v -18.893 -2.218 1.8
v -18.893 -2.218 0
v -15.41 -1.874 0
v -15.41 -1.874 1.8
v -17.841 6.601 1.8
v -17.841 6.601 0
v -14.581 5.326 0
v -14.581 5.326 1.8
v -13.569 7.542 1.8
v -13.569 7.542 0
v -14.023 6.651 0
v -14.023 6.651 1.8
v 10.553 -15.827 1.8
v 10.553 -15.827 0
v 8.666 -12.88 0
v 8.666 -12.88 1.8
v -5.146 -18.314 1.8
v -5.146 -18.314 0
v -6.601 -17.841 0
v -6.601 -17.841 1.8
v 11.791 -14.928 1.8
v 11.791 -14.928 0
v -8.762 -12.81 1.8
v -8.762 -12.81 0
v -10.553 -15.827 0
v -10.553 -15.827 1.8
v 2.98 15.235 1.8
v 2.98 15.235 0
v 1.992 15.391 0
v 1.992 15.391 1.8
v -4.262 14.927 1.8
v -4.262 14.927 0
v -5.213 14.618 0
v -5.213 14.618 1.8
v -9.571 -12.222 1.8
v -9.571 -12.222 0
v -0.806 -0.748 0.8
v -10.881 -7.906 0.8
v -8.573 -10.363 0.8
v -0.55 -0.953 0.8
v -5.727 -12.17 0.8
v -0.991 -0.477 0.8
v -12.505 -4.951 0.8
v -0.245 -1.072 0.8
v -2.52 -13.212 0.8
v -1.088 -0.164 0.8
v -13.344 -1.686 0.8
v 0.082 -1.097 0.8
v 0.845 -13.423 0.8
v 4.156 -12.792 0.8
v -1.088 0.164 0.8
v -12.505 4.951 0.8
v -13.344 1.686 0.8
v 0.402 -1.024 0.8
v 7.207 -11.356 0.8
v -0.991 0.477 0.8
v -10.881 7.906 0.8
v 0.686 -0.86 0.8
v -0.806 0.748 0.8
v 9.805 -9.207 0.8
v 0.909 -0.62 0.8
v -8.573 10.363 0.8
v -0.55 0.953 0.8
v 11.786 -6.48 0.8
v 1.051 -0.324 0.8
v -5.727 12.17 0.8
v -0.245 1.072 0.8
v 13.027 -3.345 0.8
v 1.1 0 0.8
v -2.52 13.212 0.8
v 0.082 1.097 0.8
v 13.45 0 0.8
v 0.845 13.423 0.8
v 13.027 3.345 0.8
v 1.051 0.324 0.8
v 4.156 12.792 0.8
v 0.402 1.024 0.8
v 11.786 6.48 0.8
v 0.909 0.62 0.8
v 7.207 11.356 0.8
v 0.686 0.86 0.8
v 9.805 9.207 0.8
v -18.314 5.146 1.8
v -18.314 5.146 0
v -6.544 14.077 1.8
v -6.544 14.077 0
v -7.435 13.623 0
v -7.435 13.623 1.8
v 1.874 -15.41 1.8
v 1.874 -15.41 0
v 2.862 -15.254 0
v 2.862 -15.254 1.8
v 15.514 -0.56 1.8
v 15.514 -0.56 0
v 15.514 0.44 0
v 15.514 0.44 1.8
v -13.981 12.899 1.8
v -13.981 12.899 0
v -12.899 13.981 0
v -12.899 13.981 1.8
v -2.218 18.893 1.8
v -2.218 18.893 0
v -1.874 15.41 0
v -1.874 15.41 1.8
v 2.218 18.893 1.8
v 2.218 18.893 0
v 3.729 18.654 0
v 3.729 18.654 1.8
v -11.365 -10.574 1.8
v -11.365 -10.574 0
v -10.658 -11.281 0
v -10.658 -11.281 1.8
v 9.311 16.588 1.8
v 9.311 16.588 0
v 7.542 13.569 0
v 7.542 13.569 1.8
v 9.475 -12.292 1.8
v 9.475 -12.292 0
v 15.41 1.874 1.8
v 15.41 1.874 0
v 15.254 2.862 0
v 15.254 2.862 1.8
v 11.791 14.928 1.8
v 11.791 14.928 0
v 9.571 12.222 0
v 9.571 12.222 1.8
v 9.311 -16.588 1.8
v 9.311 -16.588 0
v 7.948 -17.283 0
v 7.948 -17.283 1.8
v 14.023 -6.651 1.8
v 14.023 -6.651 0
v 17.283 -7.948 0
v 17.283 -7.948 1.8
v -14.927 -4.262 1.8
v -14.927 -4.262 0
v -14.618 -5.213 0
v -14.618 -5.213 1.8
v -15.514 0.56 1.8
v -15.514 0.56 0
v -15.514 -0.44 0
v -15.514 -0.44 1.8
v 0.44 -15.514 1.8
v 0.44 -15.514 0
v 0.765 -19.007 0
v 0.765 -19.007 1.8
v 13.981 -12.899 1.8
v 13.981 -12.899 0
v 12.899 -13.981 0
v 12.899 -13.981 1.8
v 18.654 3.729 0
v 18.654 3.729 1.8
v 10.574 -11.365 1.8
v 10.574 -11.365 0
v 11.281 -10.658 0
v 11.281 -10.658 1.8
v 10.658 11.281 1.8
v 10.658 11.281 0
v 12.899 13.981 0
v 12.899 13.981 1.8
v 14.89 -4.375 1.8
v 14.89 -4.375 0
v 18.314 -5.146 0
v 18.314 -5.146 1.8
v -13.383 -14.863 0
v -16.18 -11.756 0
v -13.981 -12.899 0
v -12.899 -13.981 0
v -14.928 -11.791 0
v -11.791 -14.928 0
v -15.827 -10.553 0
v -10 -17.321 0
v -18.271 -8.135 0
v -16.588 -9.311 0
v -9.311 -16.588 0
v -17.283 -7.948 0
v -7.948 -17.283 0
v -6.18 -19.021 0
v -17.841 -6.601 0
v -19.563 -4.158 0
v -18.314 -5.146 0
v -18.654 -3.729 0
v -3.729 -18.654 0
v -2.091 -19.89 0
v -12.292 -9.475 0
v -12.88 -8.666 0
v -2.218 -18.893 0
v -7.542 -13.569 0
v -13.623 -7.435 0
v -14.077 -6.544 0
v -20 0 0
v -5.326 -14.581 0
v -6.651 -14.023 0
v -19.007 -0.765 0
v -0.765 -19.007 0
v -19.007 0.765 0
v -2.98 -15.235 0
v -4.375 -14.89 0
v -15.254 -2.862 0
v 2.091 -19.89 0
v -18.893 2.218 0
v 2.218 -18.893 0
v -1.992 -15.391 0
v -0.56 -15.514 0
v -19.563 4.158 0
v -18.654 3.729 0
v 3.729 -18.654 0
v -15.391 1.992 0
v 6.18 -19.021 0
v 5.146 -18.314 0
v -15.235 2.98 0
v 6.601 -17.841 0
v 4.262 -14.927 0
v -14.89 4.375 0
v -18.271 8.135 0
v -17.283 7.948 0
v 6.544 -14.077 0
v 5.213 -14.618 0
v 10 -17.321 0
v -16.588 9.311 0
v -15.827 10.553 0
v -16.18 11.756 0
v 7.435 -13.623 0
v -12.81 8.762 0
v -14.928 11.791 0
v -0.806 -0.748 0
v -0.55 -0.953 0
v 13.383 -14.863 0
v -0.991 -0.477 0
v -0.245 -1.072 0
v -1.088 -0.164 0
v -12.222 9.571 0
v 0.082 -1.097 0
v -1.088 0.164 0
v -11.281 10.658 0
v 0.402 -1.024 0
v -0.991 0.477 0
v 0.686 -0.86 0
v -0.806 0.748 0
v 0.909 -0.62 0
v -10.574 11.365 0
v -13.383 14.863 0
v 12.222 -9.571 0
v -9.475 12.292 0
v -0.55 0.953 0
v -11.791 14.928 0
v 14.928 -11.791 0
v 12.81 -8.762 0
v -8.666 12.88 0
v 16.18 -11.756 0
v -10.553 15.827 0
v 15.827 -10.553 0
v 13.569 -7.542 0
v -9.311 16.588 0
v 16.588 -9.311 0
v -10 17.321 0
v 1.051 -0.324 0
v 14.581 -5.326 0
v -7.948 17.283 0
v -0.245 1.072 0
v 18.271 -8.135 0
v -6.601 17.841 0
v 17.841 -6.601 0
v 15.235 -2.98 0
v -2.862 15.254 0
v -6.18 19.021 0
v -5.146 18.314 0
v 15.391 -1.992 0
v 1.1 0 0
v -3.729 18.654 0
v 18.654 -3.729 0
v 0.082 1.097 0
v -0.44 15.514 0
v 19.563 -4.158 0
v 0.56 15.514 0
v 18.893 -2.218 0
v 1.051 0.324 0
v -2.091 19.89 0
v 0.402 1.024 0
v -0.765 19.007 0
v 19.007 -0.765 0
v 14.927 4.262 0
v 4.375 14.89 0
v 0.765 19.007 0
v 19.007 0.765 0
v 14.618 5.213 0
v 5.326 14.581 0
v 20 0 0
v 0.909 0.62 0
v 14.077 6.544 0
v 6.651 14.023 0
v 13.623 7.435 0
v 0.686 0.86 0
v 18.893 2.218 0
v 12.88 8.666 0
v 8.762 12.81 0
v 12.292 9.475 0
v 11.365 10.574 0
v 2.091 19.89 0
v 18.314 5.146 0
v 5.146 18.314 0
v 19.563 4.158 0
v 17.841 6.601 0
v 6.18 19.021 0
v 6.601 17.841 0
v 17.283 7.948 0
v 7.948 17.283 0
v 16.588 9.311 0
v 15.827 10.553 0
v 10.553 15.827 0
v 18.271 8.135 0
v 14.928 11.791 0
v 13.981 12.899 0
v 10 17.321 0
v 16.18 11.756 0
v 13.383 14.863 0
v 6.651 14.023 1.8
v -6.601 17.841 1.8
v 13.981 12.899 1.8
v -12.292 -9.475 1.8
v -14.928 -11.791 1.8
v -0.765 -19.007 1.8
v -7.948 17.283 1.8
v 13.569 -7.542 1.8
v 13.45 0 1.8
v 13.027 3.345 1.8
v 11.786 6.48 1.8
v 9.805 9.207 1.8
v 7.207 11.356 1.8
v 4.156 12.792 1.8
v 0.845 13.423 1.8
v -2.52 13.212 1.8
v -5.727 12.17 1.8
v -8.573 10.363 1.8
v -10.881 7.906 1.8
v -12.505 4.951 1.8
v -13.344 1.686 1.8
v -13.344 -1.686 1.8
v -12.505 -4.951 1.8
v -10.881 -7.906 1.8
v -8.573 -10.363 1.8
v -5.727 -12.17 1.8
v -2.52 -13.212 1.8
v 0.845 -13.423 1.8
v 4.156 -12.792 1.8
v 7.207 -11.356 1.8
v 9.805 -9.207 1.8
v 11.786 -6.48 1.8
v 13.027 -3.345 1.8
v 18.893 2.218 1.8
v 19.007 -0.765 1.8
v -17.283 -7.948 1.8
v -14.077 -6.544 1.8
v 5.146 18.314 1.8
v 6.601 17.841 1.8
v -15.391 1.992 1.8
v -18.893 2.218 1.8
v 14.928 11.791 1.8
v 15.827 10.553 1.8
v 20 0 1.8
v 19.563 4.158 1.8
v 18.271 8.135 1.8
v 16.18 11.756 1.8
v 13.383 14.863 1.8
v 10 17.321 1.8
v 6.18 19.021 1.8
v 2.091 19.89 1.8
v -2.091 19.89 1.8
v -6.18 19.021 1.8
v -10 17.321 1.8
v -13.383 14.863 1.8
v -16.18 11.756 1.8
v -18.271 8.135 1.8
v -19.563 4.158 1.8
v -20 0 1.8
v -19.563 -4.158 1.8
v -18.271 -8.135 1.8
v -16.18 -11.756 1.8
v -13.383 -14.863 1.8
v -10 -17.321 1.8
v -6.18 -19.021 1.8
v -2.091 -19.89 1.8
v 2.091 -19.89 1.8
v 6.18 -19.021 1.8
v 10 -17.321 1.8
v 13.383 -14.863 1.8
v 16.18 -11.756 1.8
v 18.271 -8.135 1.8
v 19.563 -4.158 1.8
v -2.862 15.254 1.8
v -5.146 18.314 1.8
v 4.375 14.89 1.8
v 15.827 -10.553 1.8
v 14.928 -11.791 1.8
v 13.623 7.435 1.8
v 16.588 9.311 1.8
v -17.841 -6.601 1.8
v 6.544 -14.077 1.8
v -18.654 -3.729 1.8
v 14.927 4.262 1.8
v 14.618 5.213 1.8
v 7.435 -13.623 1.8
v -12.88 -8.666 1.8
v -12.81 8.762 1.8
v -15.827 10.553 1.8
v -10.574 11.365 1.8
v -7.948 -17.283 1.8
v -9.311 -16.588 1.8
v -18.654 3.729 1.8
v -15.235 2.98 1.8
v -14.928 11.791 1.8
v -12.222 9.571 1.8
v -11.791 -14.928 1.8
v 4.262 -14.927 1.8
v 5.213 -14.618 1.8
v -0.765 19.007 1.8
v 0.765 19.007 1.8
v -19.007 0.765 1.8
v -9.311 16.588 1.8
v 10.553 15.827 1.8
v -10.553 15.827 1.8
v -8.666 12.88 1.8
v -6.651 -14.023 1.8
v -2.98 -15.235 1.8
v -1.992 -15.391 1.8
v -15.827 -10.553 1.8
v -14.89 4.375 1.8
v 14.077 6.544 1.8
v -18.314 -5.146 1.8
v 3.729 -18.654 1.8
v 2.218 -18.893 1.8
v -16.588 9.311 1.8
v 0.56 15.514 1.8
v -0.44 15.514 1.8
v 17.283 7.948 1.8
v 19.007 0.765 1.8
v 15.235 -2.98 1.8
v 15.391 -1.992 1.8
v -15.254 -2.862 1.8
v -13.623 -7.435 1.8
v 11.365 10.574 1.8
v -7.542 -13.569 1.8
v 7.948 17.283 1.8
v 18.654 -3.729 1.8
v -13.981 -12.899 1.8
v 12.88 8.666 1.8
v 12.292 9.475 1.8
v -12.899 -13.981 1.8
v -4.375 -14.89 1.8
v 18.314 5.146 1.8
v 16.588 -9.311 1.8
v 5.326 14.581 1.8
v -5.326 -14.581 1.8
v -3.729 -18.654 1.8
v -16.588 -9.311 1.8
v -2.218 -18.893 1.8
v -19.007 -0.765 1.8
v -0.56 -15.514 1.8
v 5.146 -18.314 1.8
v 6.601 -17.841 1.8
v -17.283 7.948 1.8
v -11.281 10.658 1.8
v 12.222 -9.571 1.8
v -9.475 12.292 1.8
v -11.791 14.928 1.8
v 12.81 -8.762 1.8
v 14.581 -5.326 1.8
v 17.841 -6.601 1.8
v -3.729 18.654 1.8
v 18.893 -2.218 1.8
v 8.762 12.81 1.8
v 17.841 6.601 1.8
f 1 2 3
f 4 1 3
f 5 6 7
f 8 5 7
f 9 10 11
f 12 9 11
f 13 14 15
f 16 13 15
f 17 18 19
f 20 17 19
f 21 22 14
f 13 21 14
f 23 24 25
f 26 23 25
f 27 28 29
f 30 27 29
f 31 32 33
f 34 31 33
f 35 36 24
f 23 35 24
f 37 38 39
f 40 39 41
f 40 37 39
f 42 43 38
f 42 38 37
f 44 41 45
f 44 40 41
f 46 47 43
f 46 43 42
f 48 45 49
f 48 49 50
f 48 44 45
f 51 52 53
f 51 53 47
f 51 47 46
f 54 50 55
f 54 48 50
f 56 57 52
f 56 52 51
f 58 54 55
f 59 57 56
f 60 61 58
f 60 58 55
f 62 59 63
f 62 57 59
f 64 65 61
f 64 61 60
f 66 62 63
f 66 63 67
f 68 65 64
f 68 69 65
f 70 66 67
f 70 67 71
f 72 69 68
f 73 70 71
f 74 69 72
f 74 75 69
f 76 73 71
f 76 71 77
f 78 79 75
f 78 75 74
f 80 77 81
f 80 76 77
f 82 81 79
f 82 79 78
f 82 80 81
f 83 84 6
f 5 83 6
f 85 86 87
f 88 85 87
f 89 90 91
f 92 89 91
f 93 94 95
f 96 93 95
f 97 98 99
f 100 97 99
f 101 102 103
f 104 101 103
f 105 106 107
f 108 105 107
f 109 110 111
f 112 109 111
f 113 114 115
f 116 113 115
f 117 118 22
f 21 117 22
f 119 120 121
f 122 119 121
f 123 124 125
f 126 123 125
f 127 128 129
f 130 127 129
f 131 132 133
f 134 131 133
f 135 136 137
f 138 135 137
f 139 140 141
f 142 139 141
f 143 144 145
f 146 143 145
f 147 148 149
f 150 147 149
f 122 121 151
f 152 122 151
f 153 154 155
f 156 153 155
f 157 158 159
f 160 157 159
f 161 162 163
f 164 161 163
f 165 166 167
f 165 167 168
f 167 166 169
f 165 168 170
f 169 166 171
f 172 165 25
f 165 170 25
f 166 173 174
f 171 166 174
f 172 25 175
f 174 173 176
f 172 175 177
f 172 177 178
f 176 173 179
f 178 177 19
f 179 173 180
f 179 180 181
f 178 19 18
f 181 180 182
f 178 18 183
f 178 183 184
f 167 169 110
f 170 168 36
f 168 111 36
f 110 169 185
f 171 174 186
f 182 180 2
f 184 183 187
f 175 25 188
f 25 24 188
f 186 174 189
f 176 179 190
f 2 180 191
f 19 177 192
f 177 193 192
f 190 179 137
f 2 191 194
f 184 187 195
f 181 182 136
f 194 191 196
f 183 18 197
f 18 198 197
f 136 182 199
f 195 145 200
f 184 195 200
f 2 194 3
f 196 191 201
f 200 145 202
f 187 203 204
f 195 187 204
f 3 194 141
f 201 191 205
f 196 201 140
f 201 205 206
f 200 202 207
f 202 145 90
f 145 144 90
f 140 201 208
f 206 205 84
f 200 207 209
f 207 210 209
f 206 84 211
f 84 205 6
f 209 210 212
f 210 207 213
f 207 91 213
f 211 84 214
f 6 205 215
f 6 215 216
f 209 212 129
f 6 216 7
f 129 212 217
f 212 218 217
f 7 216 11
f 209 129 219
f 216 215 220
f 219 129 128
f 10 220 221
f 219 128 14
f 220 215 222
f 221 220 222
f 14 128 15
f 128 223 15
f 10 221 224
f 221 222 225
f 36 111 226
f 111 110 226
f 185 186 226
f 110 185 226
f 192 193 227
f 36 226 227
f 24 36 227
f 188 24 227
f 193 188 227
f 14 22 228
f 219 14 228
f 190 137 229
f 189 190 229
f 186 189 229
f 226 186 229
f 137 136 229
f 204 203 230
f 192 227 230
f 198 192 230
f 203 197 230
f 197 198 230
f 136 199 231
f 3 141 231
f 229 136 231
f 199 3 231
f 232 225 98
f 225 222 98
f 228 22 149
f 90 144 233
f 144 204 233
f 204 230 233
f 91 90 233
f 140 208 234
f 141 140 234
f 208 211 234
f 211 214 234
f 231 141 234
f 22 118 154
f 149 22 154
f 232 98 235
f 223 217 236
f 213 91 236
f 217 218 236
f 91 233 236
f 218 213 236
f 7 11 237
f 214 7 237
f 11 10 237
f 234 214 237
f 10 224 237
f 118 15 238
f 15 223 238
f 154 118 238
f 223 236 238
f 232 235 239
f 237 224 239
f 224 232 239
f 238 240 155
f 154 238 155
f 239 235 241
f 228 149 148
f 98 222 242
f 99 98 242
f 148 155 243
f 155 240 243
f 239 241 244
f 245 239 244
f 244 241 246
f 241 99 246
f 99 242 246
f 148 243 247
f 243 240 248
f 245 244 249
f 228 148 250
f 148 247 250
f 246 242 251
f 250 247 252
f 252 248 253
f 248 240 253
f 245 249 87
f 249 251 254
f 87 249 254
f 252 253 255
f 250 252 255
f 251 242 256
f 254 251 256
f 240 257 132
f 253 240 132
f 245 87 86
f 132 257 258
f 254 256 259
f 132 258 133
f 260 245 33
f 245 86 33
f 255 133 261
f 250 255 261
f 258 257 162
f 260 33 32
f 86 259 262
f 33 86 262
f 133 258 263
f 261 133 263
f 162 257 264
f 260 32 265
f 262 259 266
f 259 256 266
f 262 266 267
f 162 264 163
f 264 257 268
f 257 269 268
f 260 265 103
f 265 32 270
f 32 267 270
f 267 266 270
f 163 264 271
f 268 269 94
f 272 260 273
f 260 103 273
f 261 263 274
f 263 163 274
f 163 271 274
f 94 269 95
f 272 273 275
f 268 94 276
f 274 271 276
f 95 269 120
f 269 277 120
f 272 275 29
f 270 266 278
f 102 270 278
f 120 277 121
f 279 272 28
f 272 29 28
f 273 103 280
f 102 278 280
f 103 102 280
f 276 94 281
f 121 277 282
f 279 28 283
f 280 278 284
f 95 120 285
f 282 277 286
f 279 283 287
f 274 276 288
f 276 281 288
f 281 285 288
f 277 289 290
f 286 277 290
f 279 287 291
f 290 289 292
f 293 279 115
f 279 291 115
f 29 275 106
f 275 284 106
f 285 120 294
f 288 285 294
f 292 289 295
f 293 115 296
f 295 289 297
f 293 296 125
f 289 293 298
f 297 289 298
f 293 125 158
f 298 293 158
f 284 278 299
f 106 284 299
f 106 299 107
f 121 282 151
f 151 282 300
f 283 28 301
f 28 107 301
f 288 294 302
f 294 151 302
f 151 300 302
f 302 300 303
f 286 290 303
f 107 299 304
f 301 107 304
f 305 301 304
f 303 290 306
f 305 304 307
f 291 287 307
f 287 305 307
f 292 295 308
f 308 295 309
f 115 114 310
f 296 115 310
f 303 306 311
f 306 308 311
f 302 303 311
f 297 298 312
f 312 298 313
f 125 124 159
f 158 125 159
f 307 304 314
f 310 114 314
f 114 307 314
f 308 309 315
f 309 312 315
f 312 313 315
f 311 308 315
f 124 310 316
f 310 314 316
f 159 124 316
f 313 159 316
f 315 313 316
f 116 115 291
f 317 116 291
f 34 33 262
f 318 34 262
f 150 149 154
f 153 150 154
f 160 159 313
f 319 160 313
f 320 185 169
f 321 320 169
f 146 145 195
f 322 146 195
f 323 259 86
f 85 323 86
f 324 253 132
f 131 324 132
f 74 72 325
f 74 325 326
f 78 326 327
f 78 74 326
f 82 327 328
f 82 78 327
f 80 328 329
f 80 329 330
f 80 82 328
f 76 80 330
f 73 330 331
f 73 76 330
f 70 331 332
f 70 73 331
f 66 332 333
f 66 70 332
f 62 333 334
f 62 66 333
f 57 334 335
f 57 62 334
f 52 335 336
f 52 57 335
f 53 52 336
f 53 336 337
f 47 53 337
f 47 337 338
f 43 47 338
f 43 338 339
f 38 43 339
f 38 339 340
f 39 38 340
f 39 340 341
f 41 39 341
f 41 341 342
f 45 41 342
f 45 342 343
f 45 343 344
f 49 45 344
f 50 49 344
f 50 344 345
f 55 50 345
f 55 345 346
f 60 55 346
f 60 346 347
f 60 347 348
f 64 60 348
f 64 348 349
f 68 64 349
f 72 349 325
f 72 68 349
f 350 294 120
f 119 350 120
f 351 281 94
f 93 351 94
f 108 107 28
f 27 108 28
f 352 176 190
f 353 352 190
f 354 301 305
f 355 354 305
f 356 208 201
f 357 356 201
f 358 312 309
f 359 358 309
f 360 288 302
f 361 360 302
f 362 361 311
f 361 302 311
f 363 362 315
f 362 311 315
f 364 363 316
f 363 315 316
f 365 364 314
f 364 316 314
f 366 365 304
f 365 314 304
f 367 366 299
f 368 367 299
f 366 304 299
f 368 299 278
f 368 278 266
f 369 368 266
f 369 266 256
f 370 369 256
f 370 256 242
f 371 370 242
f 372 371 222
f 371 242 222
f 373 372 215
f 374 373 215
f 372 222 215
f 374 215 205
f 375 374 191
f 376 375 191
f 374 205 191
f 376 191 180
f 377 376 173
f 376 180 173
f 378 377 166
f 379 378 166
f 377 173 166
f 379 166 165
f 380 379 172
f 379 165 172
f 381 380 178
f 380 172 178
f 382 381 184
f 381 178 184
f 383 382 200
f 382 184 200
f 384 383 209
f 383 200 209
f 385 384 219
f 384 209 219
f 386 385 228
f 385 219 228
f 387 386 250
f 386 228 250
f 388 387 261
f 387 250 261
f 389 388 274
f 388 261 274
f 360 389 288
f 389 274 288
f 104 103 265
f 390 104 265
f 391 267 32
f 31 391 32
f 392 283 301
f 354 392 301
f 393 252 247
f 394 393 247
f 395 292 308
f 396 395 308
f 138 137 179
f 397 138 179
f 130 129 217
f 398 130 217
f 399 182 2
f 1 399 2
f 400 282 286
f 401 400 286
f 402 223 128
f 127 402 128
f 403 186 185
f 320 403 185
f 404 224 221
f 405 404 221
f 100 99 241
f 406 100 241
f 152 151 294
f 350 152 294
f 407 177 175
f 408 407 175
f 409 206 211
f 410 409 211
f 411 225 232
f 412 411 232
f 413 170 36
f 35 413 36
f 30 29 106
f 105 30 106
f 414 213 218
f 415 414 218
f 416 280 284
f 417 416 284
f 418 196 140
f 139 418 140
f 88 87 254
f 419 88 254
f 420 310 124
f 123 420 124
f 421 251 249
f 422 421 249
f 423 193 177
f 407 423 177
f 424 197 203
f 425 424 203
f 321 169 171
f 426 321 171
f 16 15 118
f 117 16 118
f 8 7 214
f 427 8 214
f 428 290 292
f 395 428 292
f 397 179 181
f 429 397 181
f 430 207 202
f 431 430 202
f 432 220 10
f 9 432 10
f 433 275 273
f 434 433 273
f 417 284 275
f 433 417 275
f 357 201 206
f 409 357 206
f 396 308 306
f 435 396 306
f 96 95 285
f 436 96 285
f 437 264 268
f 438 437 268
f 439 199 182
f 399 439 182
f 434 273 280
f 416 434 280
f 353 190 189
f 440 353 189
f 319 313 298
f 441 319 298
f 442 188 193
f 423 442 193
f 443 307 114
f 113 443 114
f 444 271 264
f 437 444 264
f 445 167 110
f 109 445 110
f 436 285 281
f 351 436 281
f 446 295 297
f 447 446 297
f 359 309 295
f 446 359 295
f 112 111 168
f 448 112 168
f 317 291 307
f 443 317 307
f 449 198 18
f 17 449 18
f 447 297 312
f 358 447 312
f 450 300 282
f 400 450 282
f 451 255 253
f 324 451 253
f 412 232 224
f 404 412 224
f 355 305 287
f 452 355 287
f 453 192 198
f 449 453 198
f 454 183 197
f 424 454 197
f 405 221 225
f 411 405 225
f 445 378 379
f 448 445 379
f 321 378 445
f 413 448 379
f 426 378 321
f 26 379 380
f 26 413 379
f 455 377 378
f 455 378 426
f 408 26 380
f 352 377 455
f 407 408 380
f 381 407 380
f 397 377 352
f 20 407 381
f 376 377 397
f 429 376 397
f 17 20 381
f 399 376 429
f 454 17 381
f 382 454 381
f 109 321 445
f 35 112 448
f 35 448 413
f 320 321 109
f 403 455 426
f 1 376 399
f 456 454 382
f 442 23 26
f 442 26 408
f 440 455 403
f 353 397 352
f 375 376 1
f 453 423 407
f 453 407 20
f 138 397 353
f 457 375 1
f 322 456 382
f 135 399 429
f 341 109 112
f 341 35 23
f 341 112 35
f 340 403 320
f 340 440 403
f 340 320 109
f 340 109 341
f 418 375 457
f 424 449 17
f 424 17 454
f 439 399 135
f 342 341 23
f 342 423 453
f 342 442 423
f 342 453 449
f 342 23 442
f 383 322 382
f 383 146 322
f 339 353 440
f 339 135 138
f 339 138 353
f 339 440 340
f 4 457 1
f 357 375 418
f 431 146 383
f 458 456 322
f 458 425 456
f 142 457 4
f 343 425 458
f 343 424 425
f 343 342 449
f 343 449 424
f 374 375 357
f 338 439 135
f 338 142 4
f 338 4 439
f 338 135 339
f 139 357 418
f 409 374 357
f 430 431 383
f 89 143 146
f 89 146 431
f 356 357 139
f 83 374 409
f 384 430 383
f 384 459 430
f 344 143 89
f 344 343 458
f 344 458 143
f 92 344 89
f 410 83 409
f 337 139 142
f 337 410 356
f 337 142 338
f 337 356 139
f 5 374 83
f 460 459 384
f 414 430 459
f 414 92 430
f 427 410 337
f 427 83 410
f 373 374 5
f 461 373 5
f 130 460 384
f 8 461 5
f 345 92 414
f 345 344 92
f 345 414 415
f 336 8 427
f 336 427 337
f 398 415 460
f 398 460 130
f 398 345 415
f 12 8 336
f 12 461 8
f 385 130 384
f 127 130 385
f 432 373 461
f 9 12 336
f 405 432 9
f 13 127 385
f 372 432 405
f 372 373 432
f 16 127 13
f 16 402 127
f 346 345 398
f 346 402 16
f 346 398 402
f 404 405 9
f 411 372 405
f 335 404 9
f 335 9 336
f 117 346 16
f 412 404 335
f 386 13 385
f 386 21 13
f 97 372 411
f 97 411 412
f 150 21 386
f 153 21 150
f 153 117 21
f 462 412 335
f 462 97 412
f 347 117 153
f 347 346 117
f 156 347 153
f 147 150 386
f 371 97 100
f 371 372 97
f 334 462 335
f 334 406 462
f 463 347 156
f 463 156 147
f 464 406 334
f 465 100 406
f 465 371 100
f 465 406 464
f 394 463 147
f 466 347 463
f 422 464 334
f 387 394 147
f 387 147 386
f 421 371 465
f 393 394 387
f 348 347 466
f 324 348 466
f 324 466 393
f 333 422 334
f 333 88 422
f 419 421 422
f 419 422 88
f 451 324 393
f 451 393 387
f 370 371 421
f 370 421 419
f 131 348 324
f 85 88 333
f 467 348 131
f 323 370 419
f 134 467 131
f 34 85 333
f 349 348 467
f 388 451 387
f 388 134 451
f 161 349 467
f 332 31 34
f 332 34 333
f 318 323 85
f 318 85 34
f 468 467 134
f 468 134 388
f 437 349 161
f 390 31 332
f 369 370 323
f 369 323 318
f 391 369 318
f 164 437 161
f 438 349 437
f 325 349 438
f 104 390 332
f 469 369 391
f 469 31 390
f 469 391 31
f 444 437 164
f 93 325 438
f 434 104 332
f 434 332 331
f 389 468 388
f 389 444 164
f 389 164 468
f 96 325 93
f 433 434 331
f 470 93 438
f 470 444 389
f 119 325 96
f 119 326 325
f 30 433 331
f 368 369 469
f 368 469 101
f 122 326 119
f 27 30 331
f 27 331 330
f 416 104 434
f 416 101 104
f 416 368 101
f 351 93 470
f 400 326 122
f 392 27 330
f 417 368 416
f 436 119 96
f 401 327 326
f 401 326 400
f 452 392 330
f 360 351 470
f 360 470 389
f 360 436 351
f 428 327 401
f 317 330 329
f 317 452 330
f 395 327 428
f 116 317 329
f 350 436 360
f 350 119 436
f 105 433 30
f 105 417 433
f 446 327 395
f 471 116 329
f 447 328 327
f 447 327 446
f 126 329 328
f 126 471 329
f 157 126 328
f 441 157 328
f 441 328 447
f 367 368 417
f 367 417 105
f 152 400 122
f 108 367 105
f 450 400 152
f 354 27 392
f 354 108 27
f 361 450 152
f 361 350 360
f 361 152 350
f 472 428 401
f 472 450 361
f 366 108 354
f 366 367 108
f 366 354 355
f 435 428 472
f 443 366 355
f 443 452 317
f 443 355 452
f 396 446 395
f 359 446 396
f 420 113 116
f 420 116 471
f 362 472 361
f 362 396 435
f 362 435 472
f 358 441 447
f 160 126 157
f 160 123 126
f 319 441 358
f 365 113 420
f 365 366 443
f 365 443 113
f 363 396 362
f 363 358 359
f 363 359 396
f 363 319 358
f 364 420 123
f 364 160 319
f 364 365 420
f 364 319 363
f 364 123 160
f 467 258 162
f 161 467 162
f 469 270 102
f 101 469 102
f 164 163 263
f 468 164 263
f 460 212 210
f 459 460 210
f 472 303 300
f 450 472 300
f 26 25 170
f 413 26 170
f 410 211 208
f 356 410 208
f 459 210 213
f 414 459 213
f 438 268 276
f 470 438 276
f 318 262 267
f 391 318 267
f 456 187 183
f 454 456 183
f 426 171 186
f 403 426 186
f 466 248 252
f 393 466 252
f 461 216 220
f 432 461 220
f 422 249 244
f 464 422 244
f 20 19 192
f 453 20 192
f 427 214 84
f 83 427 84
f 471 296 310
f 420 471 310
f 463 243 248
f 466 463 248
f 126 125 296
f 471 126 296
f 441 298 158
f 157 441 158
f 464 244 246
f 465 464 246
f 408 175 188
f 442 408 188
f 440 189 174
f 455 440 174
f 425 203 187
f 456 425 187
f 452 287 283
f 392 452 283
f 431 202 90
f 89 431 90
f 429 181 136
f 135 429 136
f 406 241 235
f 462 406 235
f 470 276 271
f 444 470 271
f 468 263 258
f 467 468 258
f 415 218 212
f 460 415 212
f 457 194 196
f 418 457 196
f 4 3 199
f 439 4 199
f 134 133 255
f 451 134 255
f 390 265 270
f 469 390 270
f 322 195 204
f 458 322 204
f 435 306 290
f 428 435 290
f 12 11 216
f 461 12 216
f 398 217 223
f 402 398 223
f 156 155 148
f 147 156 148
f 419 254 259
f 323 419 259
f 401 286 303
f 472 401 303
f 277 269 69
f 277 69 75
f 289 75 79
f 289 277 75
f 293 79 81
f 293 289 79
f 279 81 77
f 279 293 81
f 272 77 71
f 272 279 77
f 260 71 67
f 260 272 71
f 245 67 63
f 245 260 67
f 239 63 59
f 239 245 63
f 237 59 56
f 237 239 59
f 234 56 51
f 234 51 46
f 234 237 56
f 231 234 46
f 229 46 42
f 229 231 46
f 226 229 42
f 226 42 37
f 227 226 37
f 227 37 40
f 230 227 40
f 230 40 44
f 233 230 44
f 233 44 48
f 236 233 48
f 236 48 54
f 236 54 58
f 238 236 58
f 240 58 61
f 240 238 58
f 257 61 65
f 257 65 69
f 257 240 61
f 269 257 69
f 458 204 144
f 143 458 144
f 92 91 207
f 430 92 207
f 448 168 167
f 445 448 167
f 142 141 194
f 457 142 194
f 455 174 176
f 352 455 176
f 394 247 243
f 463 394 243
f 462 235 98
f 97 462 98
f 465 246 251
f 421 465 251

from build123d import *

# Parameters (mm, degrees)
F0_R     = 20
F0_R_2   = 13.45
F1_DEPTH = 1.8
F0_R_3   = 1.1
F2_DEPTH = 0.8


with BuildPart() as f1:
    # F0 (on Top) → F1 (new body)
    with BuildSketch(Plane.XY):
        Circle(F0_R)
        Polygon((-10.553413, -15.827023), (-11.791209, -14.927711), (-9.571323, -12.221773), (-8.762306, -12.809558), align=None, mode=Mode.SUBTRACT)
        Polygon((-14.927711, -11.791209), (-15.827023, -10.553413), (-12.879604, -8.665895), (-12.291819, -9.474912), align=None, mode=Mode.SUBTRACT)
        Polygon((-12.899375, -13.981248), (-13.981248, -12.899375), (-11.365391, -10.574017), (-10.658284, -11.281124), align=None, mode=Mode.SUBTRACT)
        Polygon((-7.947591, -17.283083), (-9.310831, -16.588478), (-7.541578, -13.568587), (-6.650571, -14.022578), align=None, mode=Mode.SUBTRACT)
        Polygon((-5.146073, -18.313577), (-6.60119, -17.840781), (-5.326134, -14.581298), (-4.375077, -14.890315), align=None, mode=Mode.SUBTRACT)
        Polygon((-2.217842, -18.89313), (-3.729005, -18.653785), (-2.979543, -15.234969), (-1.991854, -15.391403), align=None, mode=Mode.SUBTRACT)
        Polygon((-16.588478, -9.310831), (-17.283083, -7.947591), (-14.07668, -6.544389), (-13.622689, -7.435396), align=None, mode=Mode.SUBTRACT)
        Polygon((-17.840781, -6.60119), (-18.313577, -5.146073), (-14.927141, -4.261739), (-14.618124, -5.212796), align=None, mode=Mode.SUBTRACT)
        Polygon((-18.653785, -3.729005), (-18.89313, -2.217842), (-15.410046, -1.874151), (-15.253611, -2.861839), align=None, mode=Mode.SUBTRACT)
        Polygon((0.765, -19.007471), (-0.765, -19.007471), (-0.559585, -15.513504), (0.440415, -15.513504), align=None, mode=Mode.SUBTRACT)
        Polygon((3.729005, -18.653785), (2.217842, -18.89313), (1.874151, -15.410046), (2.861839, -15.253611), align=None, mode=Mode.SUBTRACT)
        Polygon((6.60119, -17.840781), (5.146073, -18.313577), (4.261739, -14.927141), (5.212796, -14.618124), align=None, mode=Mode.SUBTRACT)
        Polygon((9.310831, -16.588478), (7.947591, -17.283083), (6.544389, -14.07668), (7.435396, -13.622689), align=None, mode=Mode.SUBTRACT)
        Polygon((11.791209, -14.927711), (10.553413, -15.827023), (8.665895, -12.879604), (9.474912, -12.291819), align=None, mode=Mode.SUBTRACT)
        Polygon((13.981248, -12.899375), (12.899375, -13.981248), (10.574017, -11.365391), (11.281124, -10.658284), align=None, mode=Mode.SUBTRACT)
        Polygon((15.827023, -10.553413), (14.927711, -11.791209), (12.221773, -9.571323), (12.809558, -8.762306), align=None, mode=Mode.SUBTRACT)
        Polygon((17.283083, -7.947591), (16.588478, -9.310831), (13.568587, -7.541578), (14.022578, -6.650571), align=None, mode=Mode.SUBTRACT)
        Polygon((18.313577, -5.146073), (17.840781, -6.60119), (14.581298, -5.326134), (14.890315, -4.375077), align=None, mode=Mode.SUBTRACT)
        Polygon((18.89313, -2.217842), (18.653785, -3.729005), (15.234969, -2.979543), (15.391403, -1.991854), align=None, mode=Mode.SUBTRACT)
        Polygon((-19.007471, -0.765), (-19.007471, 0.765), (-15.513504, 0.559585), (-15.513504, -0.440415), align=None, mode=Mode.SUBTRACT)
        Polygon((-18.89313, 2.217842), (-18.653785, 3.729005), (-15.234969, 2.979543), (-15.391403, 1.991854), align=None, mode=Mode.SUBTRACT)
        Polygon((-18.313577, 5.146073), (-17.840781, 6.60119), (-14.581298, 5.326134), (-14.890315, 4.375077), align=None, mode=Mode.SUBTRACT)
        Polygon((-17.283083, 7.947591), (-16.588478, 9.310831), (-13.568587, 7.541578), (-14.022578, 6.650571), align=None, mode=Mode.SUBTRACT)
        Polygon((-15.827023, 10.553413), (-14.927711, 11.791209), (-12.221773, 9.571323), (-12.809558, 8.762306), align=None, mode=Mode.SUBTRACT)
        Polygon((-13.981248, 12.899375), (-12.899375, 13.981248), (-10.574017, 11.365391), (-11.281124, 10.658284), align=None, mode=Mode.SUBTRACT)
        Polygon((-11.791209, 14.927711), (-10.553413, 15.827023), (-8.665895, 12.879604), (-9.474912, 12.291819), align=None, mode=Mode.SUBTRACT)
        Polygon((-9.310831, 16.588478), (-7.947591, 17.283083), (-6.544389, 14.07668), (-7.435396, 13.622689), align=None, mode=Mode.SUBTRACT)
        Polygon((-6.60119, 17.840781), (-5.146073, 18.313577), (-4.261739, 14.927141), (-5.212796, 14.618124), align=None, mode=Mode.SUBTRACT)
        Polygon((-3.729005, 18.653785), (-2.217842, 18.89313), (-1.874151, 15.410046), (-2.861839, 15.253611), align=None, mode=Mode.SUBTRACT)
        Circle(F0_R_2, mode=Mode.SUBTRACT)
        Polygon((19.007471, 0.765), (19.007471, -0.765), (15.513504, -0.559585), (15.513504, 0.440415), align=None, mode=Mode.SUBTRACT)
        Polygon((18.653785, 3.729005), (18.89313, 2.217842), (15.410046, 1.874151), (15.253611, 2.861839), align=None, mode=Mode.SUBTRACT)
        Polygon((17.840781, 6.60119), (18.313577, 5.146073), (14.927141, 4.261739), (14.618124, 5.212796), align=None, mode=Mode.SUBTRACT)
        Polygon((16.588478, 9.310831), (17.283083, 7.947591), (14.07668, 6.544389), (13.622689, 7.435396), align=None, mode=Mode.SUBTRACT)
        Polygon((-0.765, 19.007471), (0.765, 19.007471), (0.559585, 15.513504), (-0.440415, 15.513504), align=None, mode=Mode.SUBTRACT)
        Polygon((2.217842, 18.89313), (3.729005, 18.653785), (2.979543, 15.234969), (1.991854, 15.391403), align=None, mode=Mode.SUBTRACT)
        Polygon((5.146073, 18.313577), (6.60119, 17.840781), (5.326134, 14.581298), (4.375077, 14.890315), align=None, mode=Mode.SUBTRACT)
        Polygon((7.947591, 17.283083), (9.310831, 16.588478), (7.541578, 13.568587), (6.650571, 14.022578), align=None, mode=Mode.SUBTRACT)
        Polygon((12.899375, 13.981248), (13.981248, 12.899375), (11.365391, 10.574017), (10.658284, 11.281124), align=None, mode=Mode.SUBTRACT)
        Polygon((14.927711, 11.791209), (15.827023, 10.553413), (12.879604, 8.665895), (12.291819, 9.474912), align=None, mode=Mode.SUBTRACT)
        Polygon((10.553413, 15.827023), (11.791209, 14.927711), (9.571323, 12.221773), (8.762306, 12.809558), align=None, mode=Mode.SUBTRACT)
    extrude(amount=F1_DEPTH)

    # F0 (on Top) → F2 (join)
    with BuildSketch(Plane.XY):
        Circle(F0_R_2)
        Circle(F0_R_3, mode=Mode.SUBTRACT)
    extrude(amount=F2_DEPTH)


solid = f1.part
